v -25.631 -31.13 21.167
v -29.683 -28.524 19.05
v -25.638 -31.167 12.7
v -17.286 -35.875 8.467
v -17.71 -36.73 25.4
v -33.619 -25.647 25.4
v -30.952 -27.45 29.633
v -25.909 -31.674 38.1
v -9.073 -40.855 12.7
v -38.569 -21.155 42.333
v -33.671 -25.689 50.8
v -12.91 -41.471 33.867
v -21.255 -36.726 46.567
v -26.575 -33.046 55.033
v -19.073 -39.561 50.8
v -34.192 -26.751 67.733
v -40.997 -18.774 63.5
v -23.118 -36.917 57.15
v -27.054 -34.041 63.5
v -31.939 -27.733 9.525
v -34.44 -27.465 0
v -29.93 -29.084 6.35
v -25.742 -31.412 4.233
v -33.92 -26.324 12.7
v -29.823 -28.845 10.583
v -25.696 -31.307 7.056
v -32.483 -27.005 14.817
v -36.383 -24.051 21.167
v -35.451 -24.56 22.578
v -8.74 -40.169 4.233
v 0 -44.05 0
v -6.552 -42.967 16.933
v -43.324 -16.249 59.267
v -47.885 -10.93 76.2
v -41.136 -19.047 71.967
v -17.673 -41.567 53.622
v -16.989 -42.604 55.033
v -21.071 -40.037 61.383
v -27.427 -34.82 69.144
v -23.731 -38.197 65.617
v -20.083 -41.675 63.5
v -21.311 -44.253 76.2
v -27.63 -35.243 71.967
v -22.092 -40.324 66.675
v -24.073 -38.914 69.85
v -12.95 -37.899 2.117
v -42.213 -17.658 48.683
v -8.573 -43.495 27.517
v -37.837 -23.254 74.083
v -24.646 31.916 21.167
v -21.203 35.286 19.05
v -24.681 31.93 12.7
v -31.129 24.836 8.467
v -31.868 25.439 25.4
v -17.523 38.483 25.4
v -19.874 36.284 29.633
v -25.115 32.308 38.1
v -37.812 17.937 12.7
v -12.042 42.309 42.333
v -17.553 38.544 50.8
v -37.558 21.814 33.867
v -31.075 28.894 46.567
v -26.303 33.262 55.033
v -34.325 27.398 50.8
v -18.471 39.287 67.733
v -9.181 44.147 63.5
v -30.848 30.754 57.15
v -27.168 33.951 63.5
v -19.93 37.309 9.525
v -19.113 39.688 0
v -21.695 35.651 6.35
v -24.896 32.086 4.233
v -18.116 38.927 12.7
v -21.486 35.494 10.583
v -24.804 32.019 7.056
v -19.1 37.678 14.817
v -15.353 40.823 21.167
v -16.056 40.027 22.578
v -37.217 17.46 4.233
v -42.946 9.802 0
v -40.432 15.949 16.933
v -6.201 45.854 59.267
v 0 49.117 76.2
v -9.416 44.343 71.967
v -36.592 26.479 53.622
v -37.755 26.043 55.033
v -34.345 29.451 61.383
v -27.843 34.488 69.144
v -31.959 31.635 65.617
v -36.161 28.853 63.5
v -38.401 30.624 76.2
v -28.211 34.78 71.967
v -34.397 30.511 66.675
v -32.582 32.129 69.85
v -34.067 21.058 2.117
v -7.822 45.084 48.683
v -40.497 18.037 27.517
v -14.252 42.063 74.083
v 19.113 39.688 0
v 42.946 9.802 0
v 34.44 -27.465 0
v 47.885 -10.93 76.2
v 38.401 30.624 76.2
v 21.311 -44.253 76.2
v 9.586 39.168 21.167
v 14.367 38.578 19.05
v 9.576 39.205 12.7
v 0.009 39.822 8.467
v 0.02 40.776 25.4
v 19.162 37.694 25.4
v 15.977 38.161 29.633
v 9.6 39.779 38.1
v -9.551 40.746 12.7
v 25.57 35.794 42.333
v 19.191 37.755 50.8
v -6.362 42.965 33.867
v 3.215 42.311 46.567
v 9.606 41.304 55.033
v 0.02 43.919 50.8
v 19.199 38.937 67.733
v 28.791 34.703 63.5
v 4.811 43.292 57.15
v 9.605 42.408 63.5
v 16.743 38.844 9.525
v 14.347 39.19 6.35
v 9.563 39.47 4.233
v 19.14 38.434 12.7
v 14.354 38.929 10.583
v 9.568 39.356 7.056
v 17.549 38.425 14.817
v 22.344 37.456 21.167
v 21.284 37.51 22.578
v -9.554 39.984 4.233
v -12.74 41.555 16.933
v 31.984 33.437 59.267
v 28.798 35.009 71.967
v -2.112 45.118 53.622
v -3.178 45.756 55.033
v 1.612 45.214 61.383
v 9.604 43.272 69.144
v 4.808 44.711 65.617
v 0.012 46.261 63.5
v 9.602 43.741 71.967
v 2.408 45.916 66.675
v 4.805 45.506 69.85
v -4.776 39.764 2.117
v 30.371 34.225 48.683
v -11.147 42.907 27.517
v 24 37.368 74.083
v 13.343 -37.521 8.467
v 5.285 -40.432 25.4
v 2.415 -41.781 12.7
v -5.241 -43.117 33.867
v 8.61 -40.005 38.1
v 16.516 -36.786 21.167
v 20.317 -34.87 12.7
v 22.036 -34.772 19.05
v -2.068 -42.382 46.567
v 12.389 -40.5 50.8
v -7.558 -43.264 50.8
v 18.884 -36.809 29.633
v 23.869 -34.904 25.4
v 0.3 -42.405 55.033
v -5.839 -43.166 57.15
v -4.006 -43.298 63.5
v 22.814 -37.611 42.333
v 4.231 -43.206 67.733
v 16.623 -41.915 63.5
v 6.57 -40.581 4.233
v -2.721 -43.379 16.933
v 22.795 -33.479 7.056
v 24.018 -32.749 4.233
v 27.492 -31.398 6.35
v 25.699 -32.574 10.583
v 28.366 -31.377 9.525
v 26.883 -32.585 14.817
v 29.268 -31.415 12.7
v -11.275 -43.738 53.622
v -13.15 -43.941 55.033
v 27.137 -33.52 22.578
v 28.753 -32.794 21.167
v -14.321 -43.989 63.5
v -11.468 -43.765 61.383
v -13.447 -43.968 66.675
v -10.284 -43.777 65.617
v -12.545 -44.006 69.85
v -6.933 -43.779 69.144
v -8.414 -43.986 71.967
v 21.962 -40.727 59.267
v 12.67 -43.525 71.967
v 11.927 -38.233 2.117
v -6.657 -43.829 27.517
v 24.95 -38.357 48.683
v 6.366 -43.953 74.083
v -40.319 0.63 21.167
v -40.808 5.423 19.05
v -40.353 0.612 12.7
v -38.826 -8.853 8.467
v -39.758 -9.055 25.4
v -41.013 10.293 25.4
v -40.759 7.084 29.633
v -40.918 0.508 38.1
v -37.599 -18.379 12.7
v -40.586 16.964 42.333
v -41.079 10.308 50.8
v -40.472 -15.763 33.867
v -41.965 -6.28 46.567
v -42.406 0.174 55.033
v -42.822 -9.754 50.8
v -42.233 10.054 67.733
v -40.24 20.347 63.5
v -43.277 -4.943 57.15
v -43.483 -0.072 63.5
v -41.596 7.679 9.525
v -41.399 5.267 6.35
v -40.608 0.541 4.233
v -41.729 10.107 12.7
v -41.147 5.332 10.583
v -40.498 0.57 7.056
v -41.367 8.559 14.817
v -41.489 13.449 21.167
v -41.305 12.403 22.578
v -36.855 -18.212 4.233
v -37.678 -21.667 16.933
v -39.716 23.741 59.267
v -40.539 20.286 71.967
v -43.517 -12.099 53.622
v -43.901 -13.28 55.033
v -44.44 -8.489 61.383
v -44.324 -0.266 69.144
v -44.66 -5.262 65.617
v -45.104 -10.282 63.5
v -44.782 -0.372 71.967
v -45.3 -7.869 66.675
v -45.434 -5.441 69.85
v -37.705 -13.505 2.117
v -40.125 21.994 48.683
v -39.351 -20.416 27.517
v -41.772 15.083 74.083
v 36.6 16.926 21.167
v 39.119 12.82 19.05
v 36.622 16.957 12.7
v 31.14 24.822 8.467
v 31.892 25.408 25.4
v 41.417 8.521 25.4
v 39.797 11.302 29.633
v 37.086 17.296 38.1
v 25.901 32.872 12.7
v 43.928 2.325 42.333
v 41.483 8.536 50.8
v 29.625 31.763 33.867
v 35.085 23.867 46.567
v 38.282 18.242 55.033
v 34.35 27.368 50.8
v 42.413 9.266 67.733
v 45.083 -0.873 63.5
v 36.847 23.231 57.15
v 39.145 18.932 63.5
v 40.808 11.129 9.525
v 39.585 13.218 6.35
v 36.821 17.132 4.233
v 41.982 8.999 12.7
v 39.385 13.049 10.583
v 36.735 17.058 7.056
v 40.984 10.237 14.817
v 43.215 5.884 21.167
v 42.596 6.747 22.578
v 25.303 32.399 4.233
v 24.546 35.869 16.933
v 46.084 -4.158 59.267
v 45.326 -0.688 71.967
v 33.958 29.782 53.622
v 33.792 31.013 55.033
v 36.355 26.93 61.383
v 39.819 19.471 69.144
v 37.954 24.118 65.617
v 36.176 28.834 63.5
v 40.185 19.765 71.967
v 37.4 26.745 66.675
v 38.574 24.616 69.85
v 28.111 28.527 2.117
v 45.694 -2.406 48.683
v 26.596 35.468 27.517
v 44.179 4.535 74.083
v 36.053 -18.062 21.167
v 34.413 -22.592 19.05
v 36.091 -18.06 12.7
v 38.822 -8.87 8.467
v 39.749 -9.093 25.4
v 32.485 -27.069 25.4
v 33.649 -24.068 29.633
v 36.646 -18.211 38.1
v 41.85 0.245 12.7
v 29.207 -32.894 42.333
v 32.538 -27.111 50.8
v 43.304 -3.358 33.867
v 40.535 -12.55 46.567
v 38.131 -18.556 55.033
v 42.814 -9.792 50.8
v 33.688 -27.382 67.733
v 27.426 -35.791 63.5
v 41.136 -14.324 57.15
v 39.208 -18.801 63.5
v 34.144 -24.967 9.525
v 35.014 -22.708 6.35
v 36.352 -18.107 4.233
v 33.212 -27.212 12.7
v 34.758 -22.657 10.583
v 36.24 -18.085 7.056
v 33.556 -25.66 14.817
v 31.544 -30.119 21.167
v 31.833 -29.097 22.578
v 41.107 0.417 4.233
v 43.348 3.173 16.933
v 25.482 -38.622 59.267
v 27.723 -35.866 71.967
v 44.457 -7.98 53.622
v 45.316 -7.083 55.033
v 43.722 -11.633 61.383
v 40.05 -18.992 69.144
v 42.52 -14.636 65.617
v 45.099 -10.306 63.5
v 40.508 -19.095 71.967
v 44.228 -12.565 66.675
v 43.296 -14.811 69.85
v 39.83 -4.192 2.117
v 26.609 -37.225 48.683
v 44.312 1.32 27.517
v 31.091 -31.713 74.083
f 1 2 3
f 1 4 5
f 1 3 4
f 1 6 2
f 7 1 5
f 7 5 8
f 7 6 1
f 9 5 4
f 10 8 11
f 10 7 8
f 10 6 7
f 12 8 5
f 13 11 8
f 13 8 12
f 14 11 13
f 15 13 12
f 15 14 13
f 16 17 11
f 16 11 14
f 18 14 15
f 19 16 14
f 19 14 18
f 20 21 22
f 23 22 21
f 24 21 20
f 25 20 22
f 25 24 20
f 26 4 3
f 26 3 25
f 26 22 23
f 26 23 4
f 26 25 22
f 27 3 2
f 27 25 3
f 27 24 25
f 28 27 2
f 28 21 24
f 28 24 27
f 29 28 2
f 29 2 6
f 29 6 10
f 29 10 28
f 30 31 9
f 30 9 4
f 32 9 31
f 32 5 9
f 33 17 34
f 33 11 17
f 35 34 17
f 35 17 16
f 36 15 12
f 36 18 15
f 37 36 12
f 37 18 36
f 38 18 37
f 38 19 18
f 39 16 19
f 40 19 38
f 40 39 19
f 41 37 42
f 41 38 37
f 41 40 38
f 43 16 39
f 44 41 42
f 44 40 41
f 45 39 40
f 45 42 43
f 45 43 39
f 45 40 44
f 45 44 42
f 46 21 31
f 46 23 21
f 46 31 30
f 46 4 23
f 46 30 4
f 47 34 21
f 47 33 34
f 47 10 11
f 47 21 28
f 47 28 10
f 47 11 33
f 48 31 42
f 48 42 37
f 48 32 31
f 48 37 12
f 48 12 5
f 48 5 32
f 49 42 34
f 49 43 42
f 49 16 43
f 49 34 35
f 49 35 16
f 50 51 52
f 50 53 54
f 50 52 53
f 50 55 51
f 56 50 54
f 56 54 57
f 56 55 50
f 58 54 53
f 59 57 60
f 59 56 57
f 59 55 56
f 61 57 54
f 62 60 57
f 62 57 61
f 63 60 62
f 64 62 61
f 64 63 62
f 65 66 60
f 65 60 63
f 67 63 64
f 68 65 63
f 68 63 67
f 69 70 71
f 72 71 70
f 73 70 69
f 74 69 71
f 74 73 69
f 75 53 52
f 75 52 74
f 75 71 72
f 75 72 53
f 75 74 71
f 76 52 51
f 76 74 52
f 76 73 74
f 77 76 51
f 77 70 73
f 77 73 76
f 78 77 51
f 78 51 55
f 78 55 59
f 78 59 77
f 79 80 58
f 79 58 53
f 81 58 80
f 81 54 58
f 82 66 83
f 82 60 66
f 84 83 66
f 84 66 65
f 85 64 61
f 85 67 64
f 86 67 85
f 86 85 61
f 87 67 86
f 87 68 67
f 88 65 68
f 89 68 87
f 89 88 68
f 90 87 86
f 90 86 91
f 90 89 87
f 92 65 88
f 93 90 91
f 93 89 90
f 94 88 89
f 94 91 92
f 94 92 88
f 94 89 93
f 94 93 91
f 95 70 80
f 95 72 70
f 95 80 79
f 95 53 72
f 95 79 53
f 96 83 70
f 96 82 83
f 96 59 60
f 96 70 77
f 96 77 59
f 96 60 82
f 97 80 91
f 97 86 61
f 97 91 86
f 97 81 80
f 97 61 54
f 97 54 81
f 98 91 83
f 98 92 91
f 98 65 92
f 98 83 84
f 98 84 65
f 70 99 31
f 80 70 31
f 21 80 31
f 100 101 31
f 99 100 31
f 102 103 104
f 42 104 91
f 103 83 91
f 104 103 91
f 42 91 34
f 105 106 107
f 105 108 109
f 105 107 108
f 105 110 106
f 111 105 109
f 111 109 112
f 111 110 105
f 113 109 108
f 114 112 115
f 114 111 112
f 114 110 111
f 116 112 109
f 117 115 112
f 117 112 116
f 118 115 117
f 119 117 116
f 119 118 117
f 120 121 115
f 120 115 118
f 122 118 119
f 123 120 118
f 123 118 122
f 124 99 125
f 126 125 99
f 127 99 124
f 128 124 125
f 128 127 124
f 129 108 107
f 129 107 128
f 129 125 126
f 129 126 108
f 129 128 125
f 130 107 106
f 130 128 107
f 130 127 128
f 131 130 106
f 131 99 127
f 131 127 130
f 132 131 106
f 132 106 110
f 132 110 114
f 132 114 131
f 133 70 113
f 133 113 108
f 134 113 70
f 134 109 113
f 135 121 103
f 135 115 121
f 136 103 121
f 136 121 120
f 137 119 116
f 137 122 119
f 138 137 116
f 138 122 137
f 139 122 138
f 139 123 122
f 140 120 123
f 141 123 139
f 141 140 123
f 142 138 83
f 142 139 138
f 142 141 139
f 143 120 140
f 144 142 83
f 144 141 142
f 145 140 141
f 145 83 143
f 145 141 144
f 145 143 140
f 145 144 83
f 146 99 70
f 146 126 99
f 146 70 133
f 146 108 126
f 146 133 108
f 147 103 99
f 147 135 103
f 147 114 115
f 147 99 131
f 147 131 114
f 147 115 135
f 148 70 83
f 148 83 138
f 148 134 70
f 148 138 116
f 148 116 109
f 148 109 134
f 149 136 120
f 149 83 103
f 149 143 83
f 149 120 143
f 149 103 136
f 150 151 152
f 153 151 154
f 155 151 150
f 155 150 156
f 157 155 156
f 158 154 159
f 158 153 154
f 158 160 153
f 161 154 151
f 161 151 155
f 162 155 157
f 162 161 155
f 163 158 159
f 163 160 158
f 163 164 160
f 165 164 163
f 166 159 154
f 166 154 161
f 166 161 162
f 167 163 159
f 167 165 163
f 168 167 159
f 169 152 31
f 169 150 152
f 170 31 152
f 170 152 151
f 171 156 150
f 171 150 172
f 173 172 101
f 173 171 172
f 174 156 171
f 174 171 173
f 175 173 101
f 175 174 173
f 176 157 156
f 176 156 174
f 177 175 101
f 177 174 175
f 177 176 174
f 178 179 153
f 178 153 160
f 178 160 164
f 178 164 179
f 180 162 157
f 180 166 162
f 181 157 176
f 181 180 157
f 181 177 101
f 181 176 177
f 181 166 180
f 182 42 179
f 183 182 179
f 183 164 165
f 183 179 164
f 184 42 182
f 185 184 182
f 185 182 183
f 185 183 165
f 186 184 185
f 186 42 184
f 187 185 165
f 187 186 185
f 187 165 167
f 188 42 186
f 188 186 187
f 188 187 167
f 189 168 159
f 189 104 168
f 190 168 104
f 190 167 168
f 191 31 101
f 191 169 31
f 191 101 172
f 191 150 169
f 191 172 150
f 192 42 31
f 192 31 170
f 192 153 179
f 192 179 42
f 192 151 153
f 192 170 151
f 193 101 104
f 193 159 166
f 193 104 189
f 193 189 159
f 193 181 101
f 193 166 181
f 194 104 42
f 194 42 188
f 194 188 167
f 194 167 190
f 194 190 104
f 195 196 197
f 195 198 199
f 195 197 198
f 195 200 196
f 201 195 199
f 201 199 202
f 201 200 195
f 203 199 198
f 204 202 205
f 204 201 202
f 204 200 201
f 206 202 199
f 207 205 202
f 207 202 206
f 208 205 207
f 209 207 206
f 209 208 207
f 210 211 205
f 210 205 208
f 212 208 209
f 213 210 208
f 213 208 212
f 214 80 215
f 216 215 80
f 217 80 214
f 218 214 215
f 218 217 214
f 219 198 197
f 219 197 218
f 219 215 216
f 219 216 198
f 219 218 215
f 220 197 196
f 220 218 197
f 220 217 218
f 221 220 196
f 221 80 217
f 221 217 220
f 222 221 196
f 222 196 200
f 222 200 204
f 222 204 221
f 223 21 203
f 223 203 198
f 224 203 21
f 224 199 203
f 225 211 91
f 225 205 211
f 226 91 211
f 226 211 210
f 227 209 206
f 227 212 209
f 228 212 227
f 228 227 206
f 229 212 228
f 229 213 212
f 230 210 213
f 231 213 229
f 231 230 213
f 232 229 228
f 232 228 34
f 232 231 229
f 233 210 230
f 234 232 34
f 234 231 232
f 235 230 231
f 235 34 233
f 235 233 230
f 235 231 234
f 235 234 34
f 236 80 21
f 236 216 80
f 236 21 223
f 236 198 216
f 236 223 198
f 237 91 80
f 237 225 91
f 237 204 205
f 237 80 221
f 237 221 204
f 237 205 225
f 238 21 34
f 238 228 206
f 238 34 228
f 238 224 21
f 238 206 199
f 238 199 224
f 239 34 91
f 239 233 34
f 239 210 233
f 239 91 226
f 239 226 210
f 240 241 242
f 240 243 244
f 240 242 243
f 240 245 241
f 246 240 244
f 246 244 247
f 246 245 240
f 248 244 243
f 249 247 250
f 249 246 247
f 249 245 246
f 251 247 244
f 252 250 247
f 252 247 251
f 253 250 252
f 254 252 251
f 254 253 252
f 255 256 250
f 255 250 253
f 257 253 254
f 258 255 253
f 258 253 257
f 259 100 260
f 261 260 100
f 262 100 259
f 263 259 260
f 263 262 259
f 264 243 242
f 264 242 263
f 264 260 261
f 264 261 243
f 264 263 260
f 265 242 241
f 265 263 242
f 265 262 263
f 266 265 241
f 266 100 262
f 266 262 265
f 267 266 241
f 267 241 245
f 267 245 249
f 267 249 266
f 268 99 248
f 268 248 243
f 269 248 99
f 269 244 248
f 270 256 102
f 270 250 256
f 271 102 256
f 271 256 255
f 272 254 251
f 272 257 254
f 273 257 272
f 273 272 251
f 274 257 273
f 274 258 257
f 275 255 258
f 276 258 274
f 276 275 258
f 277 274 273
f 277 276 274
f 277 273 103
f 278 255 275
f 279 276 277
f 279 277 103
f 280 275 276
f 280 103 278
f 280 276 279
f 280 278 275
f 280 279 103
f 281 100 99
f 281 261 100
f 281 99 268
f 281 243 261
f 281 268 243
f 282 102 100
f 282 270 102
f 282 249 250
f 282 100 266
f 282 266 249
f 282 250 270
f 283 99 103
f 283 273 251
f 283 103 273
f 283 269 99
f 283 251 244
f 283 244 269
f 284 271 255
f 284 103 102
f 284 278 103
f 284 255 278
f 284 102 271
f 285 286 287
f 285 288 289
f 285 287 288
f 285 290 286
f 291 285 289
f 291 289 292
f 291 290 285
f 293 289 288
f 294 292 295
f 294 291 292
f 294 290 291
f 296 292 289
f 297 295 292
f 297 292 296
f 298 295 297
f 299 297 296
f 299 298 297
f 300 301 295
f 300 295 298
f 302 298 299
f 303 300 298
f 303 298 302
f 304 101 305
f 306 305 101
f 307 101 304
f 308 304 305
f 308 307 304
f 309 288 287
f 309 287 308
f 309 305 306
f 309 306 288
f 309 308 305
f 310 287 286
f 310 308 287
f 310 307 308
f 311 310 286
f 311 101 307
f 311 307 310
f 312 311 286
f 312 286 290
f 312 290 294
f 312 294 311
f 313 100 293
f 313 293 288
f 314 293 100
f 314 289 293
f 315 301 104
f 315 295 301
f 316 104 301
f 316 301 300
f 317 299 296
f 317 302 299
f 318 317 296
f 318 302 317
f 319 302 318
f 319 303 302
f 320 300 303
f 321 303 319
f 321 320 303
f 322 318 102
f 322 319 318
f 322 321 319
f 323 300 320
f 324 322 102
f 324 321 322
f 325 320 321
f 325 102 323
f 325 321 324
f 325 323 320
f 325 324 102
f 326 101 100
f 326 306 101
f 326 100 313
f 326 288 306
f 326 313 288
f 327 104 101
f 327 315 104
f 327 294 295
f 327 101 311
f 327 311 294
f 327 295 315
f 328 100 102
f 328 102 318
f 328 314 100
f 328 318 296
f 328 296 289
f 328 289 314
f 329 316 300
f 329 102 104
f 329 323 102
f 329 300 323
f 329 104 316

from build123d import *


with BuildPart() as f3:
    # F0 (on Top) → F3 section 0
    with BuildSketch(Plane.XY):
        Polygon((19.112735, 39.688002), (-19.112735, 39.688002), (-42.945925, 9.802127), (-34.439958, -27.46495), (0, -44.050359), (34.439958, -27.46495), (42.945925, 9.802127), align=None)
    # F2 (on offset) → F3 section 1
    with BuildSketch(Plane.XY.offset(76.2)):
        Polygon((-21.311005, -44.252757), (21.311005, -44.252757), (47.885393, -10.929528), (38.401103, 30.623858), (0, 49.116855), (-38.401103, 30.623858), (-47.885393, -10.929528), align=None)
    loft()


solid = f3.part
